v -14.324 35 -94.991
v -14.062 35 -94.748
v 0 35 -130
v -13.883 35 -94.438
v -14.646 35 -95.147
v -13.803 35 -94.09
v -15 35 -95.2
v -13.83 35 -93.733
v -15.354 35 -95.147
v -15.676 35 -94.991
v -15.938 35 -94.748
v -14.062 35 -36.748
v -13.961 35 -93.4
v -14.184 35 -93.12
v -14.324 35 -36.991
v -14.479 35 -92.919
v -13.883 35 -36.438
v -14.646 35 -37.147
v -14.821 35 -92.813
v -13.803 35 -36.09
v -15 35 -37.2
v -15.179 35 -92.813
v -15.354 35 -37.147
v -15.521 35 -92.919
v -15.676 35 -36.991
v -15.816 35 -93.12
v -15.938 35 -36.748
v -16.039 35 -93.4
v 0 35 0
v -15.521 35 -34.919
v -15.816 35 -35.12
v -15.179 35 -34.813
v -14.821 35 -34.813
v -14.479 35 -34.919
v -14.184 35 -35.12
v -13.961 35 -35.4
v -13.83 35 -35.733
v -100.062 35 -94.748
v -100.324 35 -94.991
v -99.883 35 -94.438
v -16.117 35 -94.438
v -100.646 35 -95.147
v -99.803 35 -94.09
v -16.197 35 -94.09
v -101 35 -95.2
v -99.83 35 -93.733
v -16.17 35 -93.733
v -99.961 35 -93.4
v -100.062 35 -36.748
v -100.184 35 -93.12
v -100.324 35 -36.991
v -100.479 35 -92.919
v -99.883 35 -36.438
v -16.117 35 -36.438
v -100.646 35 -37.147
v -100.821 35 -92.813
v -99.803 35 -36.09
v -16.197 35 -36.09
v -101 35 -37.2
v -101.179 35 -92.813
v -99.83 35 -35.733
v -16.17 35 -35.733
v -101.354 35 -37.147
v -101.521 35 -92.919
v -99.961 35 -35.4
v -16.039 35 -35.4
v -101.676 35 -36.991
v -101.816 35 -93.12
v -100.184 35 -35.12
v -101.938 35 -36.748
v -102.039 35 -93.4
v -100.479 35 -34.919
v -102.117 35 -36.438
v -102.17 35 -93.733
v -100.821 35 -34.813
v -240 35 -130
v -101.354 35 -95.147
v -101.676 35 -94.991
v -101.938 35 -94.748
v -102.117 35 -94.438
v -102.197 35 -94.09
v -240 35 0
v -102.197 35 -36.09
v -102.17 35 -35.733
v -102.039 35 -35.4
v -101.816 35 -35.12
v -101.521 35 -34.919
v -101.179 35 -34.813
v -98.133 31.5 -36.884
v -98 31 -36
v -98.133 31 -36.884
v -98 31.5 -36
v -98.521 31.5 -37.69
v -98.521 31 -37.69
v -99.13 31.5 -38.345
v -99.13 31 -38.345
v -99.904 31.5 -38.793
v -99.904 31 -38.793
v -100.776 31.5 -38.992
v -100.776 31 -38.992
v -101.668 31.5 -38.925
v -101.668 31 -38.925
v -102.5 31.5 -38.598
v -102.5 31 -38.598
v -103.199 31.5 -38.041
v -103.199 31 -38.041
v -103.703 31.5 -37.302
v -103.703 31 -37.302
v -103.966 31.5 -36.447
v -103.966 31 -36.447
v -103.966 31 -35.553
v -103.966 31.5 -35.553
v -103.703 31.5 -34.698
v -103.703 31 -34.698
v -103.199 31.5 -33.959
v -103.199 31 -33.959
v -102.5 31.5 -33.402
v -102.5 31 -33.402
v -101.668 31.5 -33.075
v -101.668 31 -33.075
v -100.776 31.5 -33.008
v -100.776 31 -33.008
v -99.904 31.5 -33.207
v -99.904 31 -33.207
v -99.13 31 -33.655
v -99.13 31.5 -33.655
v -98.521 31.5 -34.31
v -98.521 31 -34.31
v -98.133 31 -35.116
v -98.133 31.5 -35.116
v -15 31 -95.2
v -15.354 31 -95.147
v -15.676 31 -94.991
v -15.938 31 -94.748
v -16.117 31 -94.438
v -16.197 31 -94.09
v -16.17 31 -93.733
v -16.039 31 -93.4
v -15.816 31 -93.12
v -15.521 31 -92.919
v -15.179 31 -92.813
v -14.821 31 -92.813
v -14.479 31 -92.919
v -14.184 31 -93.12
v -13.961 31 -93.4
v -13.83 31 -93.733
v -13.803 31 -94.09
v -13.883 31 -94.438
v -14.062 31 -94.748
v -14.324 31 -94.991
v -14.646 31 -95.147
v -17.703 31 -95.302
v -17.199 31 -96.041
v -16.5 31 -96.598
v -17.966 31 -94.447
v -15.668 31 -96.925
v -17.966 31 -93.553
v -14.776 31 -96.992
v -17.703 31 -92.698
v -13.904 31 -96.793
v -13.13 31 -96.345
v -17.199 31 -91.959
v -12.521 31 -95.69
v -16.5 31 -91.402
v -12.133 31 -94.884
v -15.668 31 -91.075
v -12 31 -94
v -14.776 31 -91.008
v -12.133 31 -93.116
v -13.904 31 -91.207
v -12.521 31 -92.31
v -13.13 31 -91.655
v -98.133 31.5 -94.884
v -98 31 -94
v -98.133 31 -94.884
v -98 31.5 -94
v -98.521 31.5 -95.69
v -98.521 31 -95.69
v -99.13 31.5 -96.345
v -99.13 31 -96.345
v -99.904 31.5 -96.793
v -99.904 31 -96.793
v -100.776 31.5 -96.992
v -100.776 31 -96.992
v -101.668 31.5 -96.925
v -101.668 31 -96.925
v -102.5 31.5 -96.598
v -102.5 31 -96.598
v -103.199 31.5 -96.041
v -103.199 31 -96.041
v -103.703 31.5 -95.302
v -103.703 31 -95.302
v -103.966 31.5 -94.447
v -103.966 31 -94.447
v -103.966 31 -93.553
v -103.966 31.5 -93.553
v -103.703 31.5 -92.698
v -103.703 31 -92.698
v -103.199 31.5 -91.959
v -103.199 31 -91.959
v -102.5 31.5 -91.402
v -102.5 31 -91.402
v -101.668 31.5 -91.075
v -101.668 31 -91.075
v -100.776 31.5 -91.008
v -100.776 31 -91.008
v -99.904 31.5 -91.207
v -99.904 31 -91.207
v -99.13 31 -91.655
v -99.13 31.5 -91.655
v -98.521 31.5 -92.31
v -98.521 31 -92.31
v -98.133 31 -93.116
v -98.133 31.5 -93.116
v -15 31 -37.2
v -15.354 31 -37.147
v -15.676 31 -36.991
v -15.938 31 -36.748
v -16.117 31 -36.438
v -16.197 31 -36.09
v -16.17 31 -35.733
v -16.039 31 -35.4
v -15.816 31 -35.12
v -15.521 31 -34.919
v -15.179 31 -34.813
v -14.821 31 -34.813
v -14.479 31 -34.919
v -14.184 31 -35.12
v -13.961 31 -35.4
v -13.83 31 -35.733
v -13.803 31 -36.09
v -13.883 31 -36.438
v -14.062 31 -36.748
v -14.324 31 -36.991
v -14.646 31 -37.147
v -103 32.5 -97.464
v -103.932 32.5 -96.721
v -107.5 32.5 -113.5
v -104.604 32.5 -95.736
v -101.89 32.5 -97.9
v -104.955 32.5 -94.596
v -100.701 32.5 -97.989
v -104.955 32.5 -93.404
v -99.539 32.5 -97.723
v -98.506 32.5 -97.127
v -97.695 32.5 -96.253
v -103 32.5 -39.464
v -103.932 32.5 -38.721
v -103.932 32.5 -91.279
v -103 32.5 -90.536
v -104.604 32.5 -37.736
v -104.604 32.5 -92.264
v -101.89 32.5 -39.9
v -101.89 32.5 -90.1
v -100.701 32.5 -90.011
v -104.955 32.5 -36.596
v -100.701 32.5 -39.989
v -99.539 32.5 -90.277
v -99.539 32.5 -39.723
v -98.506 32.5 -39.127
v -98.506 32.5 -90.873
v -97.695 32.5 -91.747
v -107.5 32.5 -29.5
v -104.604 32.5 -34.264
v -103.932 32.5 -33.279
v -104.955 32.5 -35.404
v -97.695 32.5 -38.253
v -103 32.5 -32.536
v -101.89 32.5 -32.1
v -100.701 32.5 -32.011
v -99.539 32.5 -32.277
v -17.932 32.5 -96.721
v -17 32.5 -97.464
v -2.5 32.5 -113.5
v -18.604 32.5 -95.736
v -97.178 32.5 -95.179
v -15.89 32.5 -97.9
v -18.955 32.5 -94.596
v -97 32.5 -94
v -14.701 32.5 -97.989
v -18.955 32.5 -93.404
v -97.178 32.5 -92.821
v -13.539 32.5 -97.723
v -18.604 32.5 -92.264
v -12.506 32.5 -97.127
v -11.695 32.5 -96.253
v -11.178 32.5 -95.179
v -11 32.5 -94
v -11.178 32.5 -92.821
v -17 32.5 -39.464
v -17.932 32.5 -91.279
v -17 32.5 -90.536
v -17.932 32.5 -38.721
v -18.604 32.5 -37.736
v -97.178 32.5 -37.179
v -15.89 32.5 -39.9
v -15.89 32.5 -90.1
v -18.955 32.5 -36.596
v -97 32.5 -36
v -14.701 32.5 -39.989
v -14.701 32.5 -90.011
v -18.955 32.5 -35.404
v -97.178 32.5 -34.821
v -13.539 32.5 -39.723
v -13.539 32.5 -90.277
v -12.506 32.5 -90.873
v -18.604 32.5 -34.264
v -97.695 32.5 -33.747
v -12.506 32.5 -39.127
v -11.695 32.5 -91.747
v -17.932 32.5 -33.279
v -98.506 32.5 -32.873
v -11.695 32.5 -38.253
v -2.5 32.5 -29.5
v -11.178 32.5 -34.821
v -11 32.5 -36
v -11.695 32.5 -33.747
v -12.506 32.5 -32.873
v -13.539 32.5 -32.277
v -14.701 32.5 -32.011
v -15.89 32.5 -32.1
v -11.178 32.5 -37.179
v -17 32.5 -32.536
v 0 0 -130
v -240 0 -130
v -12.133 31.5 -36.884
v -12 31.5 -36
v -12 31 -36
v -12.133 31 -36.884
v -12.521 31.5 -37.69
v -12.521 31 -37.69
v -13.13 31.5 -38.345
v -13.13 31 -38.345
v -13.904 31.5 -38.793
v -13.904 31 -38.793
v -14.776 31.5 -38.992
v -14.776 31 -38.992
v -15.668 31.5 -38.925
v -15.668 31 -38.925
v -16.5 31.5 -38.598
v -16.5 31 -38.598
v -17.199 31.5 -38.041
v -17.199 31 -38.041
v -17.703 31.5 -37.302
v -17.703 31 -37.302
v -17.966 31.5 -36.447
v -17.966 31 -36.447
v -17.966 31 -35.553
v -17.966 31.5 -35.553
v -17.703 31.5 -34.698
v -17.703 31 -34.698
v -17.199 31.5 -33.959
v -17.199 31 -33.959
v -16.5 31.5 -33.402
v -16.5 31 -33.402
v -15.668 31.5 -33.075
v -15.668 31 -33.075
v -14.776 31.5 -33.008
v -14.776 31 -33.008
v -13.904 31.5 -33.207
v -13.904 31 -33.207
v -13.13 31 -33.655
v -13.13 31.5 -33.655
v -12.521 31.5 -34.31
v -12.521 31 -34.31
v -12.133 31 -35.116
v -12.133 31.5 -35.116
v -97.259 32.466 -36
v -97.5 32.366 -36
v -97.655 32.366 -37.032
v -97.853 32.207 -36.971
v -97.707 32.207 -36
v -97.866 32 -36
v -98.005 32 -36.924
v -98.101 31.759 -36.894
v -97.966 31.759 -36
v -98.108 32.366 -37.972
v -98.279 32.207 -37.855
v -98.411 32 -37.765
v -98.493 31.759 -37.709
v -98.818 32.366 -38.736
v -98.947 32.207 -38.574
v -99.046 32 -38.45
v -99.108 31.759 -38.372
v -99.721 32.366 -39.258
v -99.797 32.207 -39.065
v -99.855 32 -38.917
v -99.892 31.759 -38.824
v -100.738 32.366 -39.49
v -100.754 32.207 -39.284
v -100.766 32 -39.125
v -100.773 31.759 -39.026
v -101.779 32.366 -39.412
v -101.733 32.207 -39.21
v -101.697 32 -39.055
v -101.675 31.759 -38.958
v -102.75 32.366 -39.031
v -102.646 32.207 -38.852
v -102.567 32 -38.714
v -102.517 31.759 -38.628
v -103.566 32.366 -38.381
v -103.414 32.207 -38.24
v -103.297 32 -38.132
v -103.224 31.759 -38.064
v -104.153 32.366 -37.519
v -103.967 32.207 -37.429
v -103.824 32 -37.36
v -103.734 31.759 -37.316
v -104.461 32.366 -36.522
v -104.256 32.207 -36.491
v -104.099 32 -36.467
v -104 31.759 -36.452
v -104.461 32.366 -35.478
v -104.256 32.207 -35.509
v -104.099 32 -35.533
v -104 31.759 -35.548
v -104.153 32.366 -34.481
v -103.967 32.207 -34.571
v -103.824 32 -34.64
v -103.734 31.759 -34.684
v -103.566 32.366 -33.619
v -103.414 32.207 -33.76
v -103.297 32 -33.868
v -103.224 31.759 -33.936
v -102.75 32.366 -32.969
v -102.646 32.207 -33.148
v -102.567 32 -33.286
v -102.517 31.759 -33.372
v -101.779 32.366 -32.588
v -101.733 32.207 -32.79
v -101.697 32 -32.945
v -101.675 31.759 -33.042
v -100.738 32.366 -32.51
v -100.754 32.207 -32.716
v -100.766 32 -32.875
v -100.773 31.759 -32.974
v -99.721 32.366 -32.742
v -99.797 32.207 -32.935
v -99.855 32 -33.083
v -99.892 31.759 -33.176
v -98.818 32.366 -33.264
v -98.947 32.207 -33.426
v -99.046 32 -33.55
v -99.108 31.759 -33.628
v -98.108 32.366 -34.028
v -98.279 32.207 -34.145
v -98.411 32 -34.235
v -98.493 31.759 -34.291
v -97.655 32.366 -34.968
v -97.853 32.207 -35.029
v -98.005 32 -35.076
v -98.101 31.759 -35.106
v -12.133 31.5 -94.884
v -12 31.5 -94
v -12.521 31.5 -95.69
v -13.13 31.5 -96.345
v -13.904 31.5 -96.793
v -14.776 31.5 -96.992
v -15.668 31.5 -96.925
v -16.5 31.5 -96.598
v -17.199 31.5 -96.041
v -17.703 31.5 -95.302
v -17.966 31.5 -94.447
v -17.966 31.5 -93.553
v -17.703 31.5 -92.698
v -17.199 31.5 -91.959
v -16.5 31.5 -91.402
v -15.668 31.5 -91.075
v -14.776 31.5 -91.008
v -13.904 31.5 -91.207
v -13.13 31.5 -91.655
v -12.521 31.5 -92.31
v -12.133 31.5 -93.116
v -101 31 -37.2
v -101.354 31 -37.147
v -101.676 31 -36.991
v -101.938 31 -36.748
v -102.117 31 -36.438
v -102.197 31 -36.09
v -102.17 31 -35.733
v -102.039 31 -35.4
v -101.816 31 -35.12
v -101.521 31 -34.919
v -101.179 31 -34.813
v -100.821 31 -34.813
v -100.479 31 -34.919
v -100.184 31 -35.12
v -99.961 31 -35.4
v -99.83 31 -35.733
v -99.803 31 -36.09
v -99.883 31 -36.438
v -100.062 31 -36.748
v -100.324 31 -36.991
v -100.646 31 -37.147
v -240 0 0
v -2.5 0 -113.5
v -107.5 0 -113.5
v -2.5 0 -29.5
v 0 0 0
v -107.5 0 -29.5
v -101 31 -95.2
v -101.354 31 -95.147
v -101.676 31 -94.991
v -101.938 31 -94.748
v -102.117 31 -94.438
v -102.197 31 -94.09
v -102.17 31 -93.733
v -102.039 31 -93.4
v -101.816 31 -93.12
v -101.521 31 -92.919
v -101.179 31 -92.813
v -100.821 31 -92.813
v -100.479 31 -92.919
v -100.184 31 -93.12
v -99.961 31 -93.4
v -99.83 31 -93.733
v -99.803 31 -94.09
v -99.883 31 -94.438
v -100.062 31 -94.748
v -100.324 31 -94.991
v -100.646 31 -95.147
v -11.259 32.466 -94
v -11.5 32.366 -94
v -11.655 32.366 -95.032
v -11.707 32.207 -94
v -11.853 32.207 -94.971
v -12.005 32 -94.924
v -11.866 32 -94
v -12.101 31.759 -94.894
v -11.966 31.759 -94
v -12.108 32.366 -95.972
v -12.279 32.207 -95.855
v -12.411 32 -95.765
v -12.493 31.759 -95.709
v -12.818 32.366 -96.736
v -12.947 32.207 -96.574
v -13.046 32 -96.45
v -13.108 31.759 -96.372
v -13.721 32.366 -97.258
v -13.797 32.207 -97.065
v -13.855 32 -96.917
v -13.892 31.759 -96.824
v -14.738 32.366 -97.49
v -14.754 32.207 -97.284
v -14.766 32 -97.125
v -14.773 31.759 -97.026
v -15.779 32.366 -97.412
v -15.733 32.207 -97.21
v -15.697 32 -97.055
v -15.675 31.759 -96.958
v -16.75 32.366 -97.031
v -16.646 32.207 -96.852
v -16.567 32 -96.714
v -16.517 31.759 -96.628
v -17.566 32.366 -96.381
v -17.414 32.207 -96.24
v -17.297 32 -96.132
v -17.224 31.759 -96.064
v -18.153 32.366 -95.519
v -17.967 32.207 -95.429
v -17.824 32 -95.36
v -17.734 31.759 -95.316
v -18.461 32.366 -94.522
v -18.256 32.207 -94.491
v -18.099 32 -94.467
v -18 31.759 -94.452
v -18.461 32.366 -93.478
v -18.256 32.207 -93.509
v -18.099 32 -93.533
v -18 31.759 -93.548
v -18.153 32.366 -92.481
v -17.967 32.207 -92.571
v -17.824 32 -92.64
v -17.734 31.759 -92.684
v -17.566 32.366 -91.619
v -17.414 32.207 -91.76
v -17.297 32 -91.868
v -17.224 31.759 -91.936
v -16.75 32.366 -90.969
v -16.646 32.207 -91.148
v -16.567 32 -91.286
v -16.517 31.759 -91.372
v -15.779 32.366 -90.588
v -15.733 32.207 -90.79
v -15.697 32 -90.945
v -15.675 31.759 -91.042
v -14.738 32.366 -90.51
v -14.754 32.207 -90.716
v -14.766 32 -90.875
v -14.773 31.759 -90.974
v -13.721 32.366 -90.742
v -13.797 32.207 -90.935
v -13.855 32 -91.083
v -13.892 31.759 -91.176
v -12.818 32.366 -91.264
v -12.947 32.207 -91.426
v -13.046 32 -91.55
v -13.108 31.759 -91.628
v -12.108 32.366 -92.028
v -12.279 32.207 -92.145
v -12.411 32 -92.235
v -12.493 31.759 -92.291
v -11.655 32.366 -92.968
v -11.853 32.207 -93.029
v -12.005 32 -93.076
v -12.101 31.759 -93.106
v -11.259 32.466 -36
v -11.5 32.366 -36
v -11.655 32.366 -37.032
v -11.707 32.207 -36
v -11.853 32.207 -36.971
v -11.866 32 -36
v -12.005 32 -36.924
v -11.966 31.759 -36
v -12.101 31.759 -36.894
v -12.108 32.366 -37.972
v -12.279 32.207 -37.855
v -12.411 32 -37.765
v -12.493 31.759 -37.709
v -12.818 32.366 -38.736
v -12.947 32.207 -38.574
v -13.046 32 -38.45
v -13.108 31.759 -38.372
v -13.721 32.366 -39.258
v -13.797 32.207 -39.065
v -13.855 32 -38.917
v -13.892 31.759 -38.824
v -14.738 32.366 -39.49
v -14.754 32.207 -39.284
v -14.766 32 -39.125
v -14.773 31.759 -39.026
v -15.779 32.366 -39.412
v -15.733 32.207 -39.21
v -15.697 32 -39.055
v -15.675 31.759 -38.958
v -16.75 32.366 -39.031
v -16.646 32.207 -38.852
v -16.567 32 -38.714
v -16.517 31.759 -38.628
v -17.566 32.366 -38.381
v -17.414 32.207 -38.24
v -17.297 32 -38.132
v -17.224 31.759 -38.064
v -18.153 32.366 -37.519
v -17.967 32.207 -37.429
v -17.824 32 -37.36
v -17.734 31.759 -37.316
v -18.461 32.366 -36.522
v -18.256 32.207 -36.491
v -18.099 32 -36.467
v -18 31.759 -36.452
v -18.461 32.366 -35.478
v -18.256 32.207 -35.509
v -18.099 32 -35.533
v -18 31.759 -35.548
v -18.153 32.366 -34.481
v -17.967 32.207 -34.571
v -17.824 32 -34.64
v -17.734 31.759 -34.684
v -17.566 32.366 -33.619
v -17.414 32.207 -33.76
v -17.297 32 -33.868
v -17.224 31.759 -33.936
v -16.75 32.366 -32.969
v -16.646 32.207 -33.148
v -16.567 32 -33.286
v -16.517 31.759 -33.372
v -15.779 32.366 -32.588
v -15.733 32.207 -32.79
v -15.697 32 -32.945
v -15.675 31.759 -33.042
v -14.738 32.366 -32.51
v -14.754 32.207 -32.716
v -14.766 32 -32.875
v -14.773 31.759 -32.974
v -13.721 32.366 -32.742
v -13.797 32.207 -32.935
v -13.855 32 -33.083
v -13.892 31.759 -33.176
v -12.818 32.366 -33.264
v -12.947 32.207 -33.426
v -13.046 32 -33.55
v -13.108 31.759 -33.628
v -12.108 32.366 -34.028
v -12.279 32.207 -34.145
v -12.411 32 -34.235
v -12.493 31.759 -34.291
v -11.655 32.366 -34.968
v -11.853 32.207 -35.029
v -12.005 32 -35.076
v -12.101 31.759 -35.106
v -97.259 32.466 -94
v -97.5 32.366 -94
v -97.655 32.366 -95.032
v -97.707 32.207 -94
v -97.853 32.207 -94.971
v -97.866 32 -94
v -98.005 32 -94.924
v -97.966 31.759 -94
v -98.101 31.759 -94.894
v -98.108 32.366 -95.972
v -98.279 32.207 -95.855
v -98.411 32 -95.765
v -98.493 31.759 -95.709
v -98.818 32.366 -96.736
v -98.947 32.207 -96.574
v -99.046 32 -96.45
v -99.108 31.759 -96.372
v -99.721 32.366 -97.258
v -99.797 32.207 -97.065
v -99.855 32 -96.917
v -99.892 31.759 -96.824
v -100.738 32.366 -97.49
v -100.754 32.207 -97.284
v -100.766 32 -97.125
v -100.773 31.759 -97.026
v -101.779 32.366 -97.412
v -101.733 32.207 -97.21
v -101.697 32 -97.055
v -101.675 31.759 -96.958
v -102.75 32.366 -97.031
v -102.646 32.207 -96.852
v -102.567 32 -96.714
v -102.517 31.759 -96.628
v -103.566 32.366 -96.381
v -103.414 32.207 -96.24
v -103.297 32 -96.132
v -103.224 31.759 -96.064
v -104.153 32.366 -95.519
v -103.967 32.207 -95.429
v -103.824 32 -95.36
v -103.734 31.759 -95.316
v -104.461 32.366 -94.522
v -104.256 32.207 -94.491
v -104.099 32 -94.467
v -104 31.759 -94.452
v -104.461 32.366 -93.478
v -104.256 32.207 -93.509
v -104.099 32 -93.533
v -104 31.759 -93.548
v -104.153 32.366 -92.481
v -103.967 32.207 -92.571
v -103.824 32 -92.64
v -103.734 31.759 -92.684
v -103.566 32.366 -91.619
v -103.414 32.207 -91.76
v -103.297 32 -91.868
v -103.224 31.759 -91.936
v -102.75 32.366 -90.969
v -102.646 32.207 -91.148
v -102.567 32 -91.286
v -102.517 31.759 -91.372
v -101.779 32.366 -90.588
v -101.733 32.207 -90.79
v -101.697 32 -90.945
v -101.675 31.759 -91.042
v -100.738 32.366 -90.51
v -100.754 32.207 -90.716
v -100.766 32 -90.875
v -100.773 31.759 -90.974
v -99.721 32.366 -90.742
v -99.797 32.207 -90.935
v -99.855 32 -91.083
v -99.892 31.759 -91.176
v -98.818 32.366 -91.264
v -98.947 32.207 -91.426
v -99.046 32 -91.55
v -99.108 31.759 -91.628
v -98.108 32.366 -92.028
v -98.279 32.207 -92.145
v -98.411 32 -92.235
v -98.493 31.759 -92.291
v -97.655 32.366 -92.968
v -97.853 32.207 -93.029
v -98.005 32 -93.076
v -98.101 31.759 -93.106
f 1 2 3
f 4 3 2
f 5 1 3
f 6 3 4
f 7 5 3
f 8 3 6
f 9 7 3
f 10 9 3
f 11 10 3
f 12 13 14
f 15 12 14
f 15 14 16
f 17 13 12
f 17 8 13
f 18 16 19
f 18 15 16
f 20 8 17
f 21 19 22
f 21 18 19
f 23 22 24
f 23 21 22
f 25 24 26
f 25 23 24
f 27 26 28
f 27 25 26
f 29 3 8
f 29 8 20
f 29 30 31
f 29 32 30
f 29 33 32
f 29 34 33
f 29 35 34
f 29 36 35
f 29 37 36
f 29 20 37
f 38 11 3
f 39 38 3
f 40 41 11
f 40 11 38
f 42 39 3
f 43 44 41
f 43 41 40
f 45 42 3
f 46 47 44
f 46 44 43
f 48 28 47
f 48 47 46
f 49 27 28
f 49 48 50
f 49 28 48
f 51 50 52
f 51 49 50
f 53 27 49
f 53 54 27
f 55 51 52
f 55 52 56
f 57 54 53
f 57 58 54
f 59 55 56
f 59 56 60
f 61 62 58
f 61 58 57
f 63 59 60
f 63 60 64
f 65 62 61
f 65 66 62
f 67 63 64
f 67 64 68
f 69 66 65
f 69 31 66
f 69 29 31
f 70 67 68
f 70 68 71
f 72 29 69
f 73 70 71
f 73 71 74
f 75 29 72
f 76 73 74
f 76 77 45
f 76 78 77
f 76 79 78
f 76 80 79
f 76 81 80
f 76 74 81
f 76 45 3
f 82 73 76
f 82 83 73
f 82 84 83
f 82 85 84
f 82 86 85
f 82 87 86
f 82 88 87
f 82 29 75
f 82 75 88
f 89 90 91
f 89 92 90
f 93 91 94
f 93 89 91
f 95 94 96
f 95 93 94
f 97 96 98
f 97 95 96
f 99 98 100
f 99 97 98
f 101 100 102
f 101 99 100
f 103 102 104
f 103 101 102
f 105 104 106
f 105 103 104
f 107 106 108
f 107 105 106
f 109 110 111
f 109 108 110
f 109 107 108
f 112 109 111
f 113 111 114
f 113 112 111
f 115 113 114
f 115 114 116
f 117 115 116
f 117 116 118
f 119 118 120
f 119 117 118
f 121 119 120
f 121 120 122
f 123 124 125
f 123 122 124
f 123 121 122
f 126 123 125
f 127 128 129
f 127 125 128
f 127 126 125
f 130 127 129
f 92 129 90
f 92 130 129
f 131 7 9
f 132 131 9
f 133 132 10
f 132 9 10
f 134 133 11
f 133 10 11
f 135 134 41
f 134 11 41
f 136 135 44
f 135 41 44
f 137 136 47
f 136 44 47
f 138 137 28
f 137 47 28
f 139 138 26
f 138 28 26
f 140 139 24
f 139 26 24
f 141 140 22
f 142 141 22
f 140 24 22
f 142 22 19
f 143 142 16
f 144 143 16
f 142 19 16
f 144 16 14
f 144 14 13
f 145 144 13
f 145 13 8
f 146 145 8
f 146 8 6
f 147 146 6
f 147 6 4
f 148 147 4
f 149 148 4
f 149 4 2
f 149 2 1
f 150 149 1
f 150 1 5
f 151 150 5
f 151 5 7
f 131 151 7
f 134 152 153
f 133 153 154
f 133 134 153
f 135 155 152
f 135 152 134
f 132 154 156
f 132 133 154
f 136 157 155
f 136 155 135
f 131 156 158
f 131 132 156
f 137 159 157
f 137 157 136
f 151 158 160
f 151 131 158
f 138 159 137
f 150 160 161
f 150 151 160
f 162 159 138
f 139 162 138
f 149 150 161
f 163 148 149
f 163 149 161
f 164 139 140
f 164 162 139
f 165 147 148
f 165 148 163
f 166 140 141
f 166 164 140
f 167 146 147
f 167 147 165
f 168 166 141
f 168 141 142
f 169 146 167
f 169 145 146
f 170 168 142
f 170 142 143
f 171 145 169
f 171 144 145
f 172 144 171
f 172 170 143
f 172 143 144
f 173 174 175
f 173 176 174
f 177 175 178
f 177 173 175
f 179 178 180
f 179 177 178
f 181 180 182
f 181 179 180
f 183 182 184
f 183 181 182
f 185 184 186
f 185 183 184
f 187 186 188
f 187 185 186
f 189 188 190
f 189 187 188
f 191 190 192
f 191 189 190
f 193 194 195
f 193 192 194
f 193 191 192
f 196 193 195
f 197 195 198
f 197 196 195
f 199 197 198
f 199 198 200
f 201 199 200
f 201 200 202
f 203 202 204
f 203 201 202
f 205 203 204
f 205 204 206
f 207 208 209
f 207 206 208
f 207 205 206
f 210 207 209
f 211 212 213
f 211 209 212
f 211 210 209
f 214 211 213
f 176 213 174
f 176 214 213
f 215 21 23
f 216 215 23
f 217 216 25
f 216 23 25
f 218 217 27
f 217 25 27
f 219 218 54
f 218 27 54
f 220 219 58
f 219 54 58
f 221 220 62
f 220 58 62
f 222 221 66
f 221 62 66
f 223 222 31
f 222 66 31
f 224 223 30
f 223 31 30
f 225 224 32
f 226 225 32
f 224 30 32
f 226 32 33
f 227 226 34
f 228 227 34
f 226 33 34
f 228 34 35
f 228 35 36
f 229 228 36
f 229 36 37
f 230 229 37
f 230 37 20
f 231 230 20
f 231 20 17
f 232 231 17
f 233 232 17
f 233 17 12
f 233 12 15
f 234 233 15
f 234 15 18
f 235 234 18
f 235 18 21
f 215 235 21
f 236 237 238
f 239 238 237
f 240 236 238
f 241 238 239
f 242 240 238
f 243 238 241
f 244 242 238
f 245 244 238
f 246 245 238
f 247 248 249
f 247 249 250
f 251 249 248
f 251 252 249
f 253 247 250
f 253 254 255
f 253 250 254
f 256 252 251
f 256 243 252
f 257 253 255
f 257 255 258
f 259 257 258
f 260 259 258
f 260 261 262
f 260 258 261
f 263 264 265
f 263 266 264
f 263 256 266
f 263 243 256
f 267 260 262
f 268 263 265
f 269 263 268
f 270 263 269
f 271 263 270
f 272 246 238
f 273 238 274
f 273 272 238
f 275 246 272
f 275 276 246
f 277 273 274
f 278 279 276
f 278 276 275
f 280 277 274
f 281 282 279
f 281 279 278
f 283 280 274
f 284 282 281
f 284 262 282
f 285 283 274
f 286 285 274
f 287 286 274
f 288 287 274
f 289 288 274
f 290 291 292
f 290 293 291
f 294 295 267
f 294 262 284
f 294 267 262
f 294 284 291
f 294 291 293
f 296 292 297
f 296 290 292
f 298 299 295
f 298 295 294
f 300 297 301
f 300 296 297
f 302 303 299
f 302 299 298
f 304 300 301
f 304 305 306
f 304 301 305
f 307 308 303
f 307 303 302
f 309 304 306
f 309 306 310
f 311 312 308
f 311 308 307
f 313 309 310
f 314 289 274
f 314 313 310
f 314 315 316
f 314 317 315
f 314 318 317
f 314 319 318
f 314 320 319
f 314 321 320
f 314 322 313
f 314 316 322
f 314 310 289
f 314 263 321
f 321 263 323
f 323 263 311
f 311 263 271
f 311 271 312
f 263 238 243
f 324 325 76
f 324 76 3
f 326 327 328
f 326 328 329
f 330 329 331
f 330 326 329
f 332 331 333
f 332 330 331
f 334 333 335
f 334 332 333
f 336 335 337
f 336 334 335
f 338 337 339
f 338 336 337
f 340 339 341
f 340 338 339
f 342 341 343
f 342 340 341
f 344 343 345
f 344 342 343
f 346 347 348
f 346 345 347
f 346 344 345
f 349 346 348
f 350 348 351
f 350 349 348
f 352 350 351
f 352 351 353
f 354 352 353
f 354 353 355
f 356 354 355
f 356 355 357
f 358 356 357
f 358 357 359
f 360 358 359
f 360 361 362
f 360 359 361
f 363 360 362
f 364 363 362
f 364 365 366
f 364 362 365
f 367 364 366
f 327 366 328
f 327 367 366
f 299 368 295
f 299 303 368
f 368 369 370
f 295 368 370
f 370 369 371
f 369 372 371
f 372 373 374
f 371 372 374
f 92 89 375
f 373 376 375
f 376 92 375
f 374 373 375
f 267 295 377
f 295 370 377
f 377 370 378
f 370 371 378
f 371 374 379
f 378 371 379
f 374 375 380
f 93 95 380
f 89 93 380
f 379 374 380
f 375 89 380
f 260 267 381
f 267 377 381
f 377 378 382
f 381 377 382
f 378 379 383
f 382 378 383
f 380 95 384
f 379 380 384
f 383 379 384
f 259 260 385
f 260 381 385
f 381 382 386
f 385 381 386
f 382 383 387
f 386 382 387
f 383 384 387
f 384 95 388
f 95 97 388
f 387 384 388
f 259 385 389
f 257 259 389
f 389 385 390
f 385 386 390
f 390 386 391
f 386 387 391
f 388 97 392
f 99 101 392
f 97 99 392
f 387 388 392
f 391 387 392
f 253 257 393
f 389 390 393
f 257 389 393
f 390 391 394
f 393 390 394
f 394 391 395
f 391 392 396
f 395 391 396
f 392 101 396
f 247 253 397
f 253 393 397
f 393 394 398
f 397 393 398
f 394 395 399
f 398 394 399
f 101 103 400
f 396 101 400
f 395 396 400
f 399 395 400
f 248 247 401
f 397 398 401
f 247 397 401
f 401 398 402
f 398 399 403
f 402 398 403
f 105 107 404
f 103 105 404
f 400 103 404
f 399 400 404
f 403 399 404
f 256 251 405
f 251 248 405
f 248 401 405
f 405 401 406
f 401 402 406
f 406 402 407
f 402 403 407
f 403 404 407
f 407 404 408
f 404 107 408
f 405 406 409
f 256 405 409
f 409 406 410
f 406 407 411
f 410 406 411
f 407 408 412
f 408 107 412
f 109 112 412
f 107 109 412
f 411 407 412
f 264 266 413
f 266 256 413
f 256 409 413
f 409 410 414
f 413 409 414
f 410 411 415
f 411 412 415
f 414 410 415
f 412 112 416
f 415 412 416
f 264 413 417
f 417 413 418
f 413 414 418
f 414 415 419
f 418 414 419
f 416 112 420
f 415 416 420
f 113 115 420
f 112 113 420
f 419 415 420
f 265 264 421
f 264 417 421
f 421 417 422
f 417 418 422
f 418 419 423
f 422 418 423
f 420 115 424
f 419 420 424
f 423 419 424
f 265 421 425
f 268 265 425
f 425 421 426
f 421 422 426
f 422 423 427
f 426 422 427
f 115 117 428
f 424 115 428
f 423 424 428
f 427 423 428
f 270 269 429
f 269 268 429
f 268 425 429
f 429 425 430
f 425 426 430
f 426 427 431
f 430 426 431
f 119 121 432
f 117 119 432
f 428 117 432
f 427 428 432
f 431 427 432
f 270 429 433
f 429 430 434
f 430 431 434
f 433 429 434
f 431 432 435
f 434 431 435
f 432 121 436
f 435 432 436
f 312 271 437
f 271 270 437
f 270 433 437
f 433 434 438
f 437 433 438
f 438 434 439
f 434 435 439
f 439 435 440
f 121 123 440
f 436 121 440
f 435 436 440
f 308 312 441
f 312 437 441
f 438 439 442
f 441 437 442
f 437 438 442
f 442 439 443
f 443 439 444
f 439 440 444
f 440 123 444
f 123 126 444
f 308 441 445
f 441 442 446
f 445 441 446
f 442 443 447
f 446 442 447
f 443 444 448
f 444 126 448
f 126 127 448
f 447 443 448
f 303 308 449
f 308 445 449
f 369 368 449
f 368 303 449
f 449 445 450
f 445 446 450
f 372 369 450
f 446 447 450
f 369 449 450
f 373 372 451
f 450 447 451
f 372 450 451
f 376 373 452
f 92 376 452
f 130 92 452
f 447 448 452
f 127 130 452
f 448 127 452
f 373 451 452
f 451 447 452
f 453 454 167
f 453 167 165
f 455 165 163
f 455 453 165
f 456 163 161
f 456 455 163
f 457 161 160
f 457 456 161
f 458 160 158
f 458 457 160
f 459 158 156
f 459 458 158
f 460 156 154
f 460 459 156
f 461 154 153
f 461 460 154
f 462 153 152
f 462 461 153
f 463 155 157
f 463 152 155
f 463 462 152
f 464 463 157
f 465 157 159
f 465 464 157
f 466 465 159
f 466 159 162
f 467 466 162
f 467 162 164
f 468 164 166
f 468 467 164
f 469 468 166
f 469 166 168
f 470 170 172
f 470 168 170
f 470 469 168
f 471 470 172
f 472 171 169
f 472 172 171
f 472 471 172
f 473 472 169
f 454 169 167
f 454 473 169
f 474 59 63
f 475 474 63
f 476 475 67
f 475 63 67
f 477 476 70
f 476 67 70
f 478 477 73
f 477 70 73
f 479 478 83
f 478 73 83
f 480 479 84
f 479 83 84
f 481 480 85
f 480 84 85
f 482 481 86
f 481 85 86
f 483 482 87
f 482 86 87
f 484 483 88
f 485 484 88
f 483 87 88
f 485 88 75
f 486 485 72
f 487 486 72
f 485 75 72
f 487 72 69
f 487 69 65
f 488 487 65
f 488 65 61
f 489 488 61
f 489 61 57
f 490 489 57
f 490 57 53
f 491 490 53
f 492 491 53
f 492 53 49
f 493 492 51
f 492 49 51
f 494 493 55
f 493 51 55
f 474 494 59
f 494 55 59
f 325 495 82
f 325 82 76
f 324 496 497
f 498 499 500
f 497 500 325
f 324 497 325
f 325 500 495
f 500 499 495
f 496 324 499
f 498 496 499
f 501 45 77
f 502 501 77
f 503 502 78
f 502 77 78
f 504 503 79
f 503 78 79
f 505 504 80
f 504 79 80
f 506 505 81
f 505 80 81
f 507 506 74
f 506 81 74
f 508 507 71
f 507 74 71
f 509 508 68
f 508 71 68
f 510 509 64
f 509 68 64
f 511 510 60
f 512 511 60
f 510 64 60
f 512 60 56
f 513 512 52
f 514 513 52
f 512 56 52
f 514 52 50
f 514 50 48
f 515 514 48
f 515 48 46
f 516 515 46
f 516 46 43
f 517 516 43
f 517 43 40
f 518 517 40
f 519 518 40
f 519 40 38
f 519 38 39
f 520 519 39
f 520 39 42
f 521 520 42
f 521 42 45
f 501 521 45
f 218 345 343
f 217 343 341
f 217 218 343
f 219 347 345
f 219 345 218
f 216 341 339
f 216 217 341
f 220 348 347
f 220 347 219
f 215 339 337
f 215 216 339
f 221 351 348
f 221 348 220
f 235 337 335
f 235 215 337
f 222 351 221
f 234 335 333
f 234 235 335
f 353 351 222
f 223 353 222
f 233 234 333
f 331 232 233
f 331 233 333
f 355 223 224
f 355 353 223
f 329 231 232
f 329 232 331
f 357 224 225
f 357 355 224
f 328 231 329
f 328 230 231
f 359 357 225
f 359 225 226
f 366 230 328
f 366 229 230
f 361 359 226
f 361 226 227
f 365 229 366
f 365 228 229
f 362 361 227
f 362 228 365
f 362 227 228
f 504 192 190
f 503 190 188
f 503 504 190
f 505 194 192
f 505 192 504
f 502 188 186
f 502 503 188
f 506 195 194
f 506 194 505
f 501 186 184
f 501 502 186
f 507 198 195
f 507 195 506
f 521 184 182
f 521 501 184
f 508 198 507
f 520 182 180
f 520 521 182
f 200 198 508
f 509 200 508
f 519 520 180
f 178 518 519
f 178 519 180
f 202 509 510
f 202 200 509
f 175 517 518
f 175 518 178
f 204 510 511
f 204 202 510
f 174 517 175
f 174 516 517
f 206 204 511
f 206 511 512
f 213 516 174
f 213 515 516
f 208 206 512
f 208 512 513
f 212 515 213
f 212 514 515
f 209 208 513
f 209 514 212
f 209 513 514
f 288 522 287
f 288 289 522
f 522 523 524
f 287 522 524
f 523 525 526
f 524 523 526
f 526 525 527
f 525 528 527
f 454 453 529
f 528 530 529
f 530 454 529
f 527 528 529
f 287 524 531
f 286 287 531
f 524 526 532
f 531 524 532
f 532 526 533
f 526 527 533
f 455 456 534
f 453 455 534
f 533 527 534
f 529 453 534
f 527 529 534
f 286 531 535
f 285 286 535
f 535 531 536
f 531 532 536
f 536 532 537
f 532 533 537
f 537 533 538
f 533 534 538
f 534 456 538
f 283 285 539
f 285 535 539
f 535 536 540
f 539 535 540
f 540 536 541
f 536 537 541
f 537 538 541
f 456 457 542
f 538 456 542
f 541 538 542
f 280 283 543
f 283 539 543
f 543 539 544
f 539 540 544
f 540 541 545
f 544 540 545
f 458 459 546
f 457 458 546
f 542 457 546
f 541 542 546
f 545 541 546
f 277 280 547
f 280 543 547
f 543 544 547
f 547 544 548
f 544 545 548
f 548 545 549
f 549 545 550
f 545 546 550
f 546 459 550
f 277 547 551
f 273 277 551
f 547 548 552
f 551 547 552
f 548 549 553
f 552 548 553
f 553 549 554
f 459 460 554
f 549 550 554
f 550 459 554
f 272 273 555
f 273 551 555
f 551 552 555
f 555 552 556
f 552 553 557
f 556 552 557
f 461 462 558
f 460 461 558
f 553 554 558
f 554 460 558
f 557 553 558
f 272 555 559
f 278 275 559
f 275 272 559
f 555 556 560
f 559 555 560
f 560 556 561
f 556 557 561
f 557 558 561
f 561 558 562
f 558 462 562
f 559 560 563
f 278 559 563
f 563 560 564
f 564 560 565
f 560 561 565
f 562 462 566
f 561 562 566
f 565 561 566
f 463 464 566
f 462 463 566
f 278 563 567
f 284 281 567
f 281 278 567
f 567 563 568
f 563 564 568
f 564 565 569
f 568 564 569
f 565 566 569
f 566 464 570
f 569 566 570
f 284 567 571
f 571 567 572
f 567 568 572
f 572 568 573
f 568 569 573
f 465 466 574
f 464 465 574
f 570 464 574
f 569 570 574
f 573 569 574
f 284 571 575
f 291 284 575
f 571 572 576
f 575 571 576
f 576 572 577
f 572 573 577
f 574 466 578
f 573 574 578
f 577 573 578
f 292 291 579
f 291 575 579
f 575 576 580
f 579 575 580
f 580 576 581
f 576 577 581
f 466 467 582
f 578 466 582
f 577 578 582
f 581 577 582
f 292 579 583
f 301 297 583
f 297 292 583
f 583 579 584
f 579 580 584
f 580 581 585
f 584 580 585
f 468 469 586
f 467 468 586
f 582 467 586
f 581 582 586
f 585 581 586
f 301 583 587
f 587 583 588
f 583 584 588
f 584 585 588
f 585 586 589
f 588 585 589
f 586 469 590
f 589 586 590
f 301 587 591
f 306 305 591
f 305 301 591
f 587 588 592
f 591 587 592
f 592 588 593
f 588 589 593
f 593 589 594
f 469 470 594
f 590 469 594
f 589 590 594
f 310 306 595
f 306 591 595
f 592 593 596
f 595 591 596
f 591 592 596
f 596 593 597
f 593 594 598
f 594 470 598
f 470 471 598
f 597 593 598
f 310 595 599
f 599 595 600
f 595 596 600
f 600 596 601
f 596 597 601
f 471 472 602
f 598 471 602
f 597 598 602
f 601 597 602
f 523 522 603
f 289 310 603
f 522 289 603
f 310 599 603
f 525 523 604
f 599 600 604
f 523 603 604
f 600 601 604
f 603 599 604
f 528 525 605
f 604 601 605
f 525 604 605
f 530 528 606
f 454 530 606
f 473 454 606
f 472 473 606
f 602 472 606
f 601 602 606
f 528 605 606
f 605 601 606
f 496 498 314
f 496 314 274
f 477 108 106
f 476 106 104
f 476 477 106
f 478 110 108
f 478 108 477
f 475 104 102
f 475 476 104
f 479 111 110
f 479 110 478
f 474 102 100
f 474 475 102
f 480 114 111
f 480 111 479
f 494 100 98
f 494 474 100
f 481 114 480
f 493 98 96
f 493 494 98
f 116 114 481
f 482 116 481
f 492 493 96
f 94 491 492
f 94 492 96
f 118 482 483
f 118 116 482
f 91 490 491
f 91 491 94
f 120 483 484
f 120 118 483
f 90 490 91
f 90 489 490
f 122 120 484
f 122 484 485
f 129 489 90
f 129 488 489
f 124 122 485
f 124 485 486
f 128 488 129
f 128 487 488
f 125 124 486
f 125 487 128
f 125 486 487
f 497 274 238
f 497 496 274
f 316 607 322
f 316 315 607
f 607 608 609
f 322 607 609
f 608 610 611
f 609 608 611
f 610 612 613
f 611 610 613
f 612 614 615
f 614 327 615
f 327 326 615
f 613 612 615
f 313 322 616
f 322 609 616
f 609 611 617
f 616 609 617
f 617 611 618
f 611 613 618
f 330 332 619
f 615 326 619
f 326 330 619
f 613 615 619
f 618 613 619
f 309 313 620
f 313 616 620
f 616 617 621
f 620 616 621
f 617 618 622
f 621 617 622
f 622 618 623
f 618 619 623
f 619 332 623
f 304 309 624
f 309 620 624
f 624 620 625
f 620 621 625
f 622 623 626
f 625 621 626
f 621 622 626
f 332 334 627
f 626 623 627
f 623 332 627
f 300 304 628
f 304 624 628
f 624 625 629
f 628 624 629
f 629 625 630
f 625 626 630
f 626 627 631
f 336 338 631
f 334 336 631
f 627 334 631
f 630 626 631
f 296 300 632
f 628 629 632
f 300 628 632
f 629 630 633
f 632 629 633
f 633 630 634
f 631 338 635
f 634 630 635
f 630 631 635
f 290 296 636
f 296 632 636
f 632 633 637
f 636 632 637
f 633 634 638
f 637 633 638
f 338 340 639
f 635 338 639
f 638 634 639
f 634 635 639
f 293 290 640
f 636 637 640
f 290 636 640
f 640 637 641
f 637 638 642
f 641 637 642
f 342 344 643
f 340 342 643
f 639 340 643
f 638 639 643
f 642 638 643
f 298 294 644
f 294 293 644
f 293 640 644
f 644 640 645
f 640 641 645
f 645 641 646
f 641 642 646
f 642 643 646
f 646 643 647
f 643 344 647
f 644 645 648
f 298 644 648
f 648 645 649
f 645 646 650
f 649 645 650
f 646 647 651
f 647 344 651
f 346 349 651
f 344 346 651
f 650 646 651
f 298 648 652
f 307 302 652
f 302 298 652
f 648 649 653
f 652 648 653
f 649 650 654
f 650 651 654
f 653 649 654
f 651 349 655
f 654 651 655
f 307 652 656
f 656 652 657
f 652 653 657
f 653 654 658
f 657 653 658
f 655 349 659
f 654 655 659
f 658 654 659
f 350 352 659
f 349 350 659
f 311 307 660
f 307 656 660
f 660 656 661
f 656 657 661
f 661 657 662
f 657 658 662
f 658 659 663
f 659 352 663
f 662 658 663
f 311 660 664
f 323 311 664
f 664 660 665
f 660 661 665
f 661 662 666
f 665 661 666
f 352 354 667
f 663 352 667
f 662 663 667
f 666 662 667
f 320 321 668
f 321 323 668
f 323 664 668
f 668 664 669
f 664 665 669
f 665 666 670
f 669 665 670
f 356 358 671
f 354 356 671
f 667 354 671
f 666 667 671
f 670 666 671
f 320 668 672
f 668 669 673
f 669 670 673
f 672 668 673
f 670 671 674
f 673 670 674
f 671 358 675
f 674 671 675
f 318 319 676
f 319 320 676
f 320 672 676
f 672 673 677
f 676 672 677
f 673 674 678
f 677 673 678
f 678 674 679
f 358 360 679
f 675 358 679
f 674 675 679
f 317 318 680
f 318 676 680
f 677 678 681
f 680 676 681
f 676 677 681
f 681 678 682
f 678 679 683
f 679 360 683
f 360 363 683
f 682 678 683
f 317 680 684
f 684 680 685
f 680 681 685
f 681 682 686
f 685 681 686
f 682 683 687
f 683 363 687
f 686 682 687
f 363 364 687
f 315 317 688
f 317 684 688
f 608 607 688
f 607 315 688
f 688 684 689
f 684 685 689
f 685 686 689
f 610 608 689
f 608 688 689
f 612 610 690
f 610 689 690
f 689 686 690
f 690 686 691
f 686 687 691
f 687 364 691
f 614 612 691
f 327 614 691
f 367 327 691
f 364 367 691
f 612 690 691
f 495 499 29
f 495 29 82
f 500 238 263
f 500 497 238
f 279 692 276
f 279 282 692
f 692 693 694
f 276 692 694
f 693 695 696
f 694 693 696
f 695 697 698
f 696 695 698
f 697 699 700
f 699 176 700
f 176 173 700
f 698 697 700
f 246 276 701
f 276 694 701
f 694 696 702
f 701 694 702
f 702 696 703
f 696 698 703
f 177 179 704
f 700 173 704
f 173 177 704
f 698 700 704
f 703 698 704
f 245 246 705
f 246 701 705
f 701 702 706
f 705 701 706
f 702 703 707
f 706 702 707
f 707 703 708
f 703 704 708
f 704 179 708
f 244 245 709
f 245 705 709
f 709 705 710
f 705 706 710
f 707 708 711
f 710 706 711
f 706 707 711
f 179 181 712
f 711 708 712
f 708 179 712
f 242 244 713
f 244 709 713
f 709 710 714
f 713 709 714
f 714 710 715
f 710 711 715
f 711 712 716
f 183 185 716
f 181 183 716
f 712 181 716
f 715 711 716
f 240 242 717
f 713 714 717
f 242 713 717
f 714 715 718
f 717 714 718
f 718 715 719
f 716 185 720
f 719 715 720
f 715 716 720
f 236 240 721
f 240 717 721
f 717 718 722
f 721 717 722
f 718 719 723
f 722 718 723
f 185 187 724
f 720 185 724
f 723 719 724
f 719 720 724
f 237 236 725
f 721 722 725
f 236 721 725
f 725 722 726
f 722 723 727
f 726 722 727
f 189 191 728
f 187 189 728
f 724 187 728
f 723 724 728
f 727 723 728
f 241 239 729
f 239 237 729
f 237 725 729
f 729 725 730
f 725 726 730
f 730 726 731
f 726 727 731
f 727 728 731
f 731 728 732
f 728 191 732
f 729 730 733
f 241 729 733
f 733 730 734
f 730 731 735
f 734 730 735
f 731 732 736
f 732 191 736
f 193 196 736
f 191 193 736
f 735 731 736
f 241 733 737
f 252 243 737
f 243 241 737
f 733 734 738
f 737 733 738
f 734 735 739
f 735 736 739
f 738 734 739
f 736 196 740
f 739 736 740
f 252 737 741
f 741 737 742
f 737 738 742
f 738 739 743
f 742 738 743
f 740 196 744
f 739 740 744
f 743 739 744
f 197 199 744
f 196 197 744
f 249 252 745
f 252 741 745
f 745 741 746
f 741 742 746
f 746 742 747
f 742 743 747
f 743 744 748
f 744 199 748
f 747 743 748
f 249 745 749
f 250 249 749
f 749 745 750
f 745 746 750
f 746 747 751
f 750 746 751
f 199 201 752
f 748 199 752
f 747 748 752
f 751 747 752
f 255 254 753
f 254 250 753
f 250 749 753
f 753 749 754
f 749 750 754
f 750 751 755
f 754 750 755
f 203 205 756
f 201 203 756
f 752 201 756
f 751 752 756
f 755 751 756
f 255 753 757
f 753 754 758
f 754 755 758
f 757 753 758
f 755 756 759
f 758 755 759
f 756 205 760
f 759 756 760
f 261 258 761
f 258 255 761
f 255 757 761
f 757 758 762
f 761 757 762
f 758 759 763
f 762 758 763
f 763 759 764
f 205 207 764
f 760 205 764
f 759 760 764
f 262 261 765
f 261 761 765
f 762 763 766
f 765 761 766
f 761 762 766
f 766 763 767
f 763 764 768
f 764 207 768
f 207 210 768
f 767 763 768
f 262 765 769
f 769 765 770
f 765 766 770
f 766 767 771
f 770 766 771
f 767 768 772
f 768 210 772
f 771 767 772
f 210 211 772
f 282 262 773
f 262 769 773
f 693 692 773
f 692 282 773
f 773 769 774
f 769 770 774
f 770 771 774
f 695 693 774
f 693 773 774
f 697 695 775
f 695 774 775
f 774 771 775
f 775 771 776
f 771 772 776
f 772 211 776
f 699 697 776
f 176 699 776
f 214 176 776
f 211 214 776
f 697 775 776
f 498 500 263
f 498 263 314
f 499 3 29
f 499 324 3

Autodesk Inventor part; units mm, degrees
ref_plane "YZ Plane" through (0, 0, 0) normal (1, 0, 0) x (0, 1, 0)
ref_plane "XZ Plane" through (0, 0, 0) normal (0, 1, 0) x (-1, 0, 0)
ref_plane "XY Plane" through (0, 0, 0) normal (0, 0, 1) x (1, 0, 0)
sketch "Sketch1" plane through (0, 0, 0) normal (0, 1, 0) x (-1, 0, 0)
  line L0 (0, 0) -> (240, 0)
  line L1 (240, 0) -> (240, -130)
  line L2 (240, -130) -> (0, -130)
  line L3 (0, -130) -> (0, 0)
  dimension "d0" = 130
  dimension "d1" = 240
extrude "Extrusion1" add sketch "Sketch1" along normal blind 35
sketch "Sketch2" plane through (0, 0, 0) normal (0, -1, 0) x (1, 0, 0)
  line L0 (-5, -111) -> (-105, -111) construction
  line L1 (-105, -111) -> (-105, -32) construction
  line L2 (-105, -32) -> (-5, -32) construction
  line L3 (-5, -32) -> (-5, -111) construction
  line L4 (-15, -94) -> (-101, -94) construction
  line L5 (-101, -94) -> (-101, -36) construction
  line L6 (-101, -36) -> (-15, -36) construction
  line L7 (-15, -36) -> (-15, -94) construction
  line L8 (-103.25, -76.2) -> (-99.35, -76.2) construction
  line L9 (-99.35, -76.2) -> (-99.35, -53.8) construction
  line L10 (-99.35, -53.8) -> (-103.25, -53.8) construction
  line L11 (-103.25, -53.8) -> (-103.25, -76.2) construction
  line L12 (0, 0) -> (-240, 0) construction
  line L13 (-240, -130) -> (0, -130) construction
  line L14 (-2.5, -113.5) -> (-107.5, -113.5)
  line L15 (-107.5, -113.5) -> (-107.5, -29.5)
  line L16 (-107.5, -29.5) -> (-2.5, -29.5)
  line L17 (-2.5, -29.5) -> (-2.5, -113.5)
  line L18 (0, -130) -> (0, 0) projected
  dimension "d5" = 100
  dimension "d6" = 86
  dimension "d7" = 58
  dimension "d8" = 79
  dimension "d9" = 4
  dimension "d10" = 4
  dimension "d12" = 22.4
  dimension "d13" = 17.8
  dimension "d14" = 130
  dimension "d16" = 53.8
  dimension "d17" = 3.9
  dimension "d18" = 1.75
  dimension "d19" = 105
  dimension "d20" = 2.5
  dimension "d21" = 84
  dimension "d22" = 2.5
  dimension "d25" = 2.5
extrude "Extrusion2" cut sketch "Sketch2" against normal blind 32.5
sketch "Sketch3" plane through (0, 32.5, 0) normal (0, -1, 0) x (1, 0, 0)
  circle A0 centre (-15, -94) radius 3
  circle A1 centre (-101, -94) radius 3
  circle A2 centre (-15, -36) radius 3
  circle A3 centre (-101, -36) radius 3
  point P0 (0, 0)
  dimension "d26" = 6
  dimension "d27" = 6
  dimension "d28" = 6
  dimension "d29" = 6
extrude "Extrusion3" add sketch "Sketch3" along normal blind 1.5
fillet "Fillet1" radius 1 4 edges at (-18, 32.5, -94) (-104, 32.5, -94) (-18, 32.5, -36) (-104, 32.5, -36)
sketch "Sketch4" plane through (-15, 31, -94) normal (0, -1, 0) x (1, 0, 0)
  circle A0 centre (0, 0) radius 3 construction
  circle A1 centre (0, 58) radius 3 construction
  circle A2 centre (-86, 58) radius 3 construction
  circle A3 centre (-86, 0) radius 3 construction
  circle A4 centre (0, 0) radius 3 construction
  circle A5 centre (-86, 58) radius 4 construction
  point P0 (15, 94)
hole "Hole1" at (-15, 31, -94) at (-15, 31, -36) at (-101, 31, -36) at (-101, 31, -94) direction (0, 1, 0) diameter 2.4 depth 4
equation "\"d10\" = d9"
equation "\"d16\" = -0.5 * d12 + 0.5 * d14"
equation "\"d22\" = -0.5 * d8 + 0.5 * d21"
equation "\"d25\" = -0.5 * d5 + 0.5 * d19"
properties part number "Chassis"
